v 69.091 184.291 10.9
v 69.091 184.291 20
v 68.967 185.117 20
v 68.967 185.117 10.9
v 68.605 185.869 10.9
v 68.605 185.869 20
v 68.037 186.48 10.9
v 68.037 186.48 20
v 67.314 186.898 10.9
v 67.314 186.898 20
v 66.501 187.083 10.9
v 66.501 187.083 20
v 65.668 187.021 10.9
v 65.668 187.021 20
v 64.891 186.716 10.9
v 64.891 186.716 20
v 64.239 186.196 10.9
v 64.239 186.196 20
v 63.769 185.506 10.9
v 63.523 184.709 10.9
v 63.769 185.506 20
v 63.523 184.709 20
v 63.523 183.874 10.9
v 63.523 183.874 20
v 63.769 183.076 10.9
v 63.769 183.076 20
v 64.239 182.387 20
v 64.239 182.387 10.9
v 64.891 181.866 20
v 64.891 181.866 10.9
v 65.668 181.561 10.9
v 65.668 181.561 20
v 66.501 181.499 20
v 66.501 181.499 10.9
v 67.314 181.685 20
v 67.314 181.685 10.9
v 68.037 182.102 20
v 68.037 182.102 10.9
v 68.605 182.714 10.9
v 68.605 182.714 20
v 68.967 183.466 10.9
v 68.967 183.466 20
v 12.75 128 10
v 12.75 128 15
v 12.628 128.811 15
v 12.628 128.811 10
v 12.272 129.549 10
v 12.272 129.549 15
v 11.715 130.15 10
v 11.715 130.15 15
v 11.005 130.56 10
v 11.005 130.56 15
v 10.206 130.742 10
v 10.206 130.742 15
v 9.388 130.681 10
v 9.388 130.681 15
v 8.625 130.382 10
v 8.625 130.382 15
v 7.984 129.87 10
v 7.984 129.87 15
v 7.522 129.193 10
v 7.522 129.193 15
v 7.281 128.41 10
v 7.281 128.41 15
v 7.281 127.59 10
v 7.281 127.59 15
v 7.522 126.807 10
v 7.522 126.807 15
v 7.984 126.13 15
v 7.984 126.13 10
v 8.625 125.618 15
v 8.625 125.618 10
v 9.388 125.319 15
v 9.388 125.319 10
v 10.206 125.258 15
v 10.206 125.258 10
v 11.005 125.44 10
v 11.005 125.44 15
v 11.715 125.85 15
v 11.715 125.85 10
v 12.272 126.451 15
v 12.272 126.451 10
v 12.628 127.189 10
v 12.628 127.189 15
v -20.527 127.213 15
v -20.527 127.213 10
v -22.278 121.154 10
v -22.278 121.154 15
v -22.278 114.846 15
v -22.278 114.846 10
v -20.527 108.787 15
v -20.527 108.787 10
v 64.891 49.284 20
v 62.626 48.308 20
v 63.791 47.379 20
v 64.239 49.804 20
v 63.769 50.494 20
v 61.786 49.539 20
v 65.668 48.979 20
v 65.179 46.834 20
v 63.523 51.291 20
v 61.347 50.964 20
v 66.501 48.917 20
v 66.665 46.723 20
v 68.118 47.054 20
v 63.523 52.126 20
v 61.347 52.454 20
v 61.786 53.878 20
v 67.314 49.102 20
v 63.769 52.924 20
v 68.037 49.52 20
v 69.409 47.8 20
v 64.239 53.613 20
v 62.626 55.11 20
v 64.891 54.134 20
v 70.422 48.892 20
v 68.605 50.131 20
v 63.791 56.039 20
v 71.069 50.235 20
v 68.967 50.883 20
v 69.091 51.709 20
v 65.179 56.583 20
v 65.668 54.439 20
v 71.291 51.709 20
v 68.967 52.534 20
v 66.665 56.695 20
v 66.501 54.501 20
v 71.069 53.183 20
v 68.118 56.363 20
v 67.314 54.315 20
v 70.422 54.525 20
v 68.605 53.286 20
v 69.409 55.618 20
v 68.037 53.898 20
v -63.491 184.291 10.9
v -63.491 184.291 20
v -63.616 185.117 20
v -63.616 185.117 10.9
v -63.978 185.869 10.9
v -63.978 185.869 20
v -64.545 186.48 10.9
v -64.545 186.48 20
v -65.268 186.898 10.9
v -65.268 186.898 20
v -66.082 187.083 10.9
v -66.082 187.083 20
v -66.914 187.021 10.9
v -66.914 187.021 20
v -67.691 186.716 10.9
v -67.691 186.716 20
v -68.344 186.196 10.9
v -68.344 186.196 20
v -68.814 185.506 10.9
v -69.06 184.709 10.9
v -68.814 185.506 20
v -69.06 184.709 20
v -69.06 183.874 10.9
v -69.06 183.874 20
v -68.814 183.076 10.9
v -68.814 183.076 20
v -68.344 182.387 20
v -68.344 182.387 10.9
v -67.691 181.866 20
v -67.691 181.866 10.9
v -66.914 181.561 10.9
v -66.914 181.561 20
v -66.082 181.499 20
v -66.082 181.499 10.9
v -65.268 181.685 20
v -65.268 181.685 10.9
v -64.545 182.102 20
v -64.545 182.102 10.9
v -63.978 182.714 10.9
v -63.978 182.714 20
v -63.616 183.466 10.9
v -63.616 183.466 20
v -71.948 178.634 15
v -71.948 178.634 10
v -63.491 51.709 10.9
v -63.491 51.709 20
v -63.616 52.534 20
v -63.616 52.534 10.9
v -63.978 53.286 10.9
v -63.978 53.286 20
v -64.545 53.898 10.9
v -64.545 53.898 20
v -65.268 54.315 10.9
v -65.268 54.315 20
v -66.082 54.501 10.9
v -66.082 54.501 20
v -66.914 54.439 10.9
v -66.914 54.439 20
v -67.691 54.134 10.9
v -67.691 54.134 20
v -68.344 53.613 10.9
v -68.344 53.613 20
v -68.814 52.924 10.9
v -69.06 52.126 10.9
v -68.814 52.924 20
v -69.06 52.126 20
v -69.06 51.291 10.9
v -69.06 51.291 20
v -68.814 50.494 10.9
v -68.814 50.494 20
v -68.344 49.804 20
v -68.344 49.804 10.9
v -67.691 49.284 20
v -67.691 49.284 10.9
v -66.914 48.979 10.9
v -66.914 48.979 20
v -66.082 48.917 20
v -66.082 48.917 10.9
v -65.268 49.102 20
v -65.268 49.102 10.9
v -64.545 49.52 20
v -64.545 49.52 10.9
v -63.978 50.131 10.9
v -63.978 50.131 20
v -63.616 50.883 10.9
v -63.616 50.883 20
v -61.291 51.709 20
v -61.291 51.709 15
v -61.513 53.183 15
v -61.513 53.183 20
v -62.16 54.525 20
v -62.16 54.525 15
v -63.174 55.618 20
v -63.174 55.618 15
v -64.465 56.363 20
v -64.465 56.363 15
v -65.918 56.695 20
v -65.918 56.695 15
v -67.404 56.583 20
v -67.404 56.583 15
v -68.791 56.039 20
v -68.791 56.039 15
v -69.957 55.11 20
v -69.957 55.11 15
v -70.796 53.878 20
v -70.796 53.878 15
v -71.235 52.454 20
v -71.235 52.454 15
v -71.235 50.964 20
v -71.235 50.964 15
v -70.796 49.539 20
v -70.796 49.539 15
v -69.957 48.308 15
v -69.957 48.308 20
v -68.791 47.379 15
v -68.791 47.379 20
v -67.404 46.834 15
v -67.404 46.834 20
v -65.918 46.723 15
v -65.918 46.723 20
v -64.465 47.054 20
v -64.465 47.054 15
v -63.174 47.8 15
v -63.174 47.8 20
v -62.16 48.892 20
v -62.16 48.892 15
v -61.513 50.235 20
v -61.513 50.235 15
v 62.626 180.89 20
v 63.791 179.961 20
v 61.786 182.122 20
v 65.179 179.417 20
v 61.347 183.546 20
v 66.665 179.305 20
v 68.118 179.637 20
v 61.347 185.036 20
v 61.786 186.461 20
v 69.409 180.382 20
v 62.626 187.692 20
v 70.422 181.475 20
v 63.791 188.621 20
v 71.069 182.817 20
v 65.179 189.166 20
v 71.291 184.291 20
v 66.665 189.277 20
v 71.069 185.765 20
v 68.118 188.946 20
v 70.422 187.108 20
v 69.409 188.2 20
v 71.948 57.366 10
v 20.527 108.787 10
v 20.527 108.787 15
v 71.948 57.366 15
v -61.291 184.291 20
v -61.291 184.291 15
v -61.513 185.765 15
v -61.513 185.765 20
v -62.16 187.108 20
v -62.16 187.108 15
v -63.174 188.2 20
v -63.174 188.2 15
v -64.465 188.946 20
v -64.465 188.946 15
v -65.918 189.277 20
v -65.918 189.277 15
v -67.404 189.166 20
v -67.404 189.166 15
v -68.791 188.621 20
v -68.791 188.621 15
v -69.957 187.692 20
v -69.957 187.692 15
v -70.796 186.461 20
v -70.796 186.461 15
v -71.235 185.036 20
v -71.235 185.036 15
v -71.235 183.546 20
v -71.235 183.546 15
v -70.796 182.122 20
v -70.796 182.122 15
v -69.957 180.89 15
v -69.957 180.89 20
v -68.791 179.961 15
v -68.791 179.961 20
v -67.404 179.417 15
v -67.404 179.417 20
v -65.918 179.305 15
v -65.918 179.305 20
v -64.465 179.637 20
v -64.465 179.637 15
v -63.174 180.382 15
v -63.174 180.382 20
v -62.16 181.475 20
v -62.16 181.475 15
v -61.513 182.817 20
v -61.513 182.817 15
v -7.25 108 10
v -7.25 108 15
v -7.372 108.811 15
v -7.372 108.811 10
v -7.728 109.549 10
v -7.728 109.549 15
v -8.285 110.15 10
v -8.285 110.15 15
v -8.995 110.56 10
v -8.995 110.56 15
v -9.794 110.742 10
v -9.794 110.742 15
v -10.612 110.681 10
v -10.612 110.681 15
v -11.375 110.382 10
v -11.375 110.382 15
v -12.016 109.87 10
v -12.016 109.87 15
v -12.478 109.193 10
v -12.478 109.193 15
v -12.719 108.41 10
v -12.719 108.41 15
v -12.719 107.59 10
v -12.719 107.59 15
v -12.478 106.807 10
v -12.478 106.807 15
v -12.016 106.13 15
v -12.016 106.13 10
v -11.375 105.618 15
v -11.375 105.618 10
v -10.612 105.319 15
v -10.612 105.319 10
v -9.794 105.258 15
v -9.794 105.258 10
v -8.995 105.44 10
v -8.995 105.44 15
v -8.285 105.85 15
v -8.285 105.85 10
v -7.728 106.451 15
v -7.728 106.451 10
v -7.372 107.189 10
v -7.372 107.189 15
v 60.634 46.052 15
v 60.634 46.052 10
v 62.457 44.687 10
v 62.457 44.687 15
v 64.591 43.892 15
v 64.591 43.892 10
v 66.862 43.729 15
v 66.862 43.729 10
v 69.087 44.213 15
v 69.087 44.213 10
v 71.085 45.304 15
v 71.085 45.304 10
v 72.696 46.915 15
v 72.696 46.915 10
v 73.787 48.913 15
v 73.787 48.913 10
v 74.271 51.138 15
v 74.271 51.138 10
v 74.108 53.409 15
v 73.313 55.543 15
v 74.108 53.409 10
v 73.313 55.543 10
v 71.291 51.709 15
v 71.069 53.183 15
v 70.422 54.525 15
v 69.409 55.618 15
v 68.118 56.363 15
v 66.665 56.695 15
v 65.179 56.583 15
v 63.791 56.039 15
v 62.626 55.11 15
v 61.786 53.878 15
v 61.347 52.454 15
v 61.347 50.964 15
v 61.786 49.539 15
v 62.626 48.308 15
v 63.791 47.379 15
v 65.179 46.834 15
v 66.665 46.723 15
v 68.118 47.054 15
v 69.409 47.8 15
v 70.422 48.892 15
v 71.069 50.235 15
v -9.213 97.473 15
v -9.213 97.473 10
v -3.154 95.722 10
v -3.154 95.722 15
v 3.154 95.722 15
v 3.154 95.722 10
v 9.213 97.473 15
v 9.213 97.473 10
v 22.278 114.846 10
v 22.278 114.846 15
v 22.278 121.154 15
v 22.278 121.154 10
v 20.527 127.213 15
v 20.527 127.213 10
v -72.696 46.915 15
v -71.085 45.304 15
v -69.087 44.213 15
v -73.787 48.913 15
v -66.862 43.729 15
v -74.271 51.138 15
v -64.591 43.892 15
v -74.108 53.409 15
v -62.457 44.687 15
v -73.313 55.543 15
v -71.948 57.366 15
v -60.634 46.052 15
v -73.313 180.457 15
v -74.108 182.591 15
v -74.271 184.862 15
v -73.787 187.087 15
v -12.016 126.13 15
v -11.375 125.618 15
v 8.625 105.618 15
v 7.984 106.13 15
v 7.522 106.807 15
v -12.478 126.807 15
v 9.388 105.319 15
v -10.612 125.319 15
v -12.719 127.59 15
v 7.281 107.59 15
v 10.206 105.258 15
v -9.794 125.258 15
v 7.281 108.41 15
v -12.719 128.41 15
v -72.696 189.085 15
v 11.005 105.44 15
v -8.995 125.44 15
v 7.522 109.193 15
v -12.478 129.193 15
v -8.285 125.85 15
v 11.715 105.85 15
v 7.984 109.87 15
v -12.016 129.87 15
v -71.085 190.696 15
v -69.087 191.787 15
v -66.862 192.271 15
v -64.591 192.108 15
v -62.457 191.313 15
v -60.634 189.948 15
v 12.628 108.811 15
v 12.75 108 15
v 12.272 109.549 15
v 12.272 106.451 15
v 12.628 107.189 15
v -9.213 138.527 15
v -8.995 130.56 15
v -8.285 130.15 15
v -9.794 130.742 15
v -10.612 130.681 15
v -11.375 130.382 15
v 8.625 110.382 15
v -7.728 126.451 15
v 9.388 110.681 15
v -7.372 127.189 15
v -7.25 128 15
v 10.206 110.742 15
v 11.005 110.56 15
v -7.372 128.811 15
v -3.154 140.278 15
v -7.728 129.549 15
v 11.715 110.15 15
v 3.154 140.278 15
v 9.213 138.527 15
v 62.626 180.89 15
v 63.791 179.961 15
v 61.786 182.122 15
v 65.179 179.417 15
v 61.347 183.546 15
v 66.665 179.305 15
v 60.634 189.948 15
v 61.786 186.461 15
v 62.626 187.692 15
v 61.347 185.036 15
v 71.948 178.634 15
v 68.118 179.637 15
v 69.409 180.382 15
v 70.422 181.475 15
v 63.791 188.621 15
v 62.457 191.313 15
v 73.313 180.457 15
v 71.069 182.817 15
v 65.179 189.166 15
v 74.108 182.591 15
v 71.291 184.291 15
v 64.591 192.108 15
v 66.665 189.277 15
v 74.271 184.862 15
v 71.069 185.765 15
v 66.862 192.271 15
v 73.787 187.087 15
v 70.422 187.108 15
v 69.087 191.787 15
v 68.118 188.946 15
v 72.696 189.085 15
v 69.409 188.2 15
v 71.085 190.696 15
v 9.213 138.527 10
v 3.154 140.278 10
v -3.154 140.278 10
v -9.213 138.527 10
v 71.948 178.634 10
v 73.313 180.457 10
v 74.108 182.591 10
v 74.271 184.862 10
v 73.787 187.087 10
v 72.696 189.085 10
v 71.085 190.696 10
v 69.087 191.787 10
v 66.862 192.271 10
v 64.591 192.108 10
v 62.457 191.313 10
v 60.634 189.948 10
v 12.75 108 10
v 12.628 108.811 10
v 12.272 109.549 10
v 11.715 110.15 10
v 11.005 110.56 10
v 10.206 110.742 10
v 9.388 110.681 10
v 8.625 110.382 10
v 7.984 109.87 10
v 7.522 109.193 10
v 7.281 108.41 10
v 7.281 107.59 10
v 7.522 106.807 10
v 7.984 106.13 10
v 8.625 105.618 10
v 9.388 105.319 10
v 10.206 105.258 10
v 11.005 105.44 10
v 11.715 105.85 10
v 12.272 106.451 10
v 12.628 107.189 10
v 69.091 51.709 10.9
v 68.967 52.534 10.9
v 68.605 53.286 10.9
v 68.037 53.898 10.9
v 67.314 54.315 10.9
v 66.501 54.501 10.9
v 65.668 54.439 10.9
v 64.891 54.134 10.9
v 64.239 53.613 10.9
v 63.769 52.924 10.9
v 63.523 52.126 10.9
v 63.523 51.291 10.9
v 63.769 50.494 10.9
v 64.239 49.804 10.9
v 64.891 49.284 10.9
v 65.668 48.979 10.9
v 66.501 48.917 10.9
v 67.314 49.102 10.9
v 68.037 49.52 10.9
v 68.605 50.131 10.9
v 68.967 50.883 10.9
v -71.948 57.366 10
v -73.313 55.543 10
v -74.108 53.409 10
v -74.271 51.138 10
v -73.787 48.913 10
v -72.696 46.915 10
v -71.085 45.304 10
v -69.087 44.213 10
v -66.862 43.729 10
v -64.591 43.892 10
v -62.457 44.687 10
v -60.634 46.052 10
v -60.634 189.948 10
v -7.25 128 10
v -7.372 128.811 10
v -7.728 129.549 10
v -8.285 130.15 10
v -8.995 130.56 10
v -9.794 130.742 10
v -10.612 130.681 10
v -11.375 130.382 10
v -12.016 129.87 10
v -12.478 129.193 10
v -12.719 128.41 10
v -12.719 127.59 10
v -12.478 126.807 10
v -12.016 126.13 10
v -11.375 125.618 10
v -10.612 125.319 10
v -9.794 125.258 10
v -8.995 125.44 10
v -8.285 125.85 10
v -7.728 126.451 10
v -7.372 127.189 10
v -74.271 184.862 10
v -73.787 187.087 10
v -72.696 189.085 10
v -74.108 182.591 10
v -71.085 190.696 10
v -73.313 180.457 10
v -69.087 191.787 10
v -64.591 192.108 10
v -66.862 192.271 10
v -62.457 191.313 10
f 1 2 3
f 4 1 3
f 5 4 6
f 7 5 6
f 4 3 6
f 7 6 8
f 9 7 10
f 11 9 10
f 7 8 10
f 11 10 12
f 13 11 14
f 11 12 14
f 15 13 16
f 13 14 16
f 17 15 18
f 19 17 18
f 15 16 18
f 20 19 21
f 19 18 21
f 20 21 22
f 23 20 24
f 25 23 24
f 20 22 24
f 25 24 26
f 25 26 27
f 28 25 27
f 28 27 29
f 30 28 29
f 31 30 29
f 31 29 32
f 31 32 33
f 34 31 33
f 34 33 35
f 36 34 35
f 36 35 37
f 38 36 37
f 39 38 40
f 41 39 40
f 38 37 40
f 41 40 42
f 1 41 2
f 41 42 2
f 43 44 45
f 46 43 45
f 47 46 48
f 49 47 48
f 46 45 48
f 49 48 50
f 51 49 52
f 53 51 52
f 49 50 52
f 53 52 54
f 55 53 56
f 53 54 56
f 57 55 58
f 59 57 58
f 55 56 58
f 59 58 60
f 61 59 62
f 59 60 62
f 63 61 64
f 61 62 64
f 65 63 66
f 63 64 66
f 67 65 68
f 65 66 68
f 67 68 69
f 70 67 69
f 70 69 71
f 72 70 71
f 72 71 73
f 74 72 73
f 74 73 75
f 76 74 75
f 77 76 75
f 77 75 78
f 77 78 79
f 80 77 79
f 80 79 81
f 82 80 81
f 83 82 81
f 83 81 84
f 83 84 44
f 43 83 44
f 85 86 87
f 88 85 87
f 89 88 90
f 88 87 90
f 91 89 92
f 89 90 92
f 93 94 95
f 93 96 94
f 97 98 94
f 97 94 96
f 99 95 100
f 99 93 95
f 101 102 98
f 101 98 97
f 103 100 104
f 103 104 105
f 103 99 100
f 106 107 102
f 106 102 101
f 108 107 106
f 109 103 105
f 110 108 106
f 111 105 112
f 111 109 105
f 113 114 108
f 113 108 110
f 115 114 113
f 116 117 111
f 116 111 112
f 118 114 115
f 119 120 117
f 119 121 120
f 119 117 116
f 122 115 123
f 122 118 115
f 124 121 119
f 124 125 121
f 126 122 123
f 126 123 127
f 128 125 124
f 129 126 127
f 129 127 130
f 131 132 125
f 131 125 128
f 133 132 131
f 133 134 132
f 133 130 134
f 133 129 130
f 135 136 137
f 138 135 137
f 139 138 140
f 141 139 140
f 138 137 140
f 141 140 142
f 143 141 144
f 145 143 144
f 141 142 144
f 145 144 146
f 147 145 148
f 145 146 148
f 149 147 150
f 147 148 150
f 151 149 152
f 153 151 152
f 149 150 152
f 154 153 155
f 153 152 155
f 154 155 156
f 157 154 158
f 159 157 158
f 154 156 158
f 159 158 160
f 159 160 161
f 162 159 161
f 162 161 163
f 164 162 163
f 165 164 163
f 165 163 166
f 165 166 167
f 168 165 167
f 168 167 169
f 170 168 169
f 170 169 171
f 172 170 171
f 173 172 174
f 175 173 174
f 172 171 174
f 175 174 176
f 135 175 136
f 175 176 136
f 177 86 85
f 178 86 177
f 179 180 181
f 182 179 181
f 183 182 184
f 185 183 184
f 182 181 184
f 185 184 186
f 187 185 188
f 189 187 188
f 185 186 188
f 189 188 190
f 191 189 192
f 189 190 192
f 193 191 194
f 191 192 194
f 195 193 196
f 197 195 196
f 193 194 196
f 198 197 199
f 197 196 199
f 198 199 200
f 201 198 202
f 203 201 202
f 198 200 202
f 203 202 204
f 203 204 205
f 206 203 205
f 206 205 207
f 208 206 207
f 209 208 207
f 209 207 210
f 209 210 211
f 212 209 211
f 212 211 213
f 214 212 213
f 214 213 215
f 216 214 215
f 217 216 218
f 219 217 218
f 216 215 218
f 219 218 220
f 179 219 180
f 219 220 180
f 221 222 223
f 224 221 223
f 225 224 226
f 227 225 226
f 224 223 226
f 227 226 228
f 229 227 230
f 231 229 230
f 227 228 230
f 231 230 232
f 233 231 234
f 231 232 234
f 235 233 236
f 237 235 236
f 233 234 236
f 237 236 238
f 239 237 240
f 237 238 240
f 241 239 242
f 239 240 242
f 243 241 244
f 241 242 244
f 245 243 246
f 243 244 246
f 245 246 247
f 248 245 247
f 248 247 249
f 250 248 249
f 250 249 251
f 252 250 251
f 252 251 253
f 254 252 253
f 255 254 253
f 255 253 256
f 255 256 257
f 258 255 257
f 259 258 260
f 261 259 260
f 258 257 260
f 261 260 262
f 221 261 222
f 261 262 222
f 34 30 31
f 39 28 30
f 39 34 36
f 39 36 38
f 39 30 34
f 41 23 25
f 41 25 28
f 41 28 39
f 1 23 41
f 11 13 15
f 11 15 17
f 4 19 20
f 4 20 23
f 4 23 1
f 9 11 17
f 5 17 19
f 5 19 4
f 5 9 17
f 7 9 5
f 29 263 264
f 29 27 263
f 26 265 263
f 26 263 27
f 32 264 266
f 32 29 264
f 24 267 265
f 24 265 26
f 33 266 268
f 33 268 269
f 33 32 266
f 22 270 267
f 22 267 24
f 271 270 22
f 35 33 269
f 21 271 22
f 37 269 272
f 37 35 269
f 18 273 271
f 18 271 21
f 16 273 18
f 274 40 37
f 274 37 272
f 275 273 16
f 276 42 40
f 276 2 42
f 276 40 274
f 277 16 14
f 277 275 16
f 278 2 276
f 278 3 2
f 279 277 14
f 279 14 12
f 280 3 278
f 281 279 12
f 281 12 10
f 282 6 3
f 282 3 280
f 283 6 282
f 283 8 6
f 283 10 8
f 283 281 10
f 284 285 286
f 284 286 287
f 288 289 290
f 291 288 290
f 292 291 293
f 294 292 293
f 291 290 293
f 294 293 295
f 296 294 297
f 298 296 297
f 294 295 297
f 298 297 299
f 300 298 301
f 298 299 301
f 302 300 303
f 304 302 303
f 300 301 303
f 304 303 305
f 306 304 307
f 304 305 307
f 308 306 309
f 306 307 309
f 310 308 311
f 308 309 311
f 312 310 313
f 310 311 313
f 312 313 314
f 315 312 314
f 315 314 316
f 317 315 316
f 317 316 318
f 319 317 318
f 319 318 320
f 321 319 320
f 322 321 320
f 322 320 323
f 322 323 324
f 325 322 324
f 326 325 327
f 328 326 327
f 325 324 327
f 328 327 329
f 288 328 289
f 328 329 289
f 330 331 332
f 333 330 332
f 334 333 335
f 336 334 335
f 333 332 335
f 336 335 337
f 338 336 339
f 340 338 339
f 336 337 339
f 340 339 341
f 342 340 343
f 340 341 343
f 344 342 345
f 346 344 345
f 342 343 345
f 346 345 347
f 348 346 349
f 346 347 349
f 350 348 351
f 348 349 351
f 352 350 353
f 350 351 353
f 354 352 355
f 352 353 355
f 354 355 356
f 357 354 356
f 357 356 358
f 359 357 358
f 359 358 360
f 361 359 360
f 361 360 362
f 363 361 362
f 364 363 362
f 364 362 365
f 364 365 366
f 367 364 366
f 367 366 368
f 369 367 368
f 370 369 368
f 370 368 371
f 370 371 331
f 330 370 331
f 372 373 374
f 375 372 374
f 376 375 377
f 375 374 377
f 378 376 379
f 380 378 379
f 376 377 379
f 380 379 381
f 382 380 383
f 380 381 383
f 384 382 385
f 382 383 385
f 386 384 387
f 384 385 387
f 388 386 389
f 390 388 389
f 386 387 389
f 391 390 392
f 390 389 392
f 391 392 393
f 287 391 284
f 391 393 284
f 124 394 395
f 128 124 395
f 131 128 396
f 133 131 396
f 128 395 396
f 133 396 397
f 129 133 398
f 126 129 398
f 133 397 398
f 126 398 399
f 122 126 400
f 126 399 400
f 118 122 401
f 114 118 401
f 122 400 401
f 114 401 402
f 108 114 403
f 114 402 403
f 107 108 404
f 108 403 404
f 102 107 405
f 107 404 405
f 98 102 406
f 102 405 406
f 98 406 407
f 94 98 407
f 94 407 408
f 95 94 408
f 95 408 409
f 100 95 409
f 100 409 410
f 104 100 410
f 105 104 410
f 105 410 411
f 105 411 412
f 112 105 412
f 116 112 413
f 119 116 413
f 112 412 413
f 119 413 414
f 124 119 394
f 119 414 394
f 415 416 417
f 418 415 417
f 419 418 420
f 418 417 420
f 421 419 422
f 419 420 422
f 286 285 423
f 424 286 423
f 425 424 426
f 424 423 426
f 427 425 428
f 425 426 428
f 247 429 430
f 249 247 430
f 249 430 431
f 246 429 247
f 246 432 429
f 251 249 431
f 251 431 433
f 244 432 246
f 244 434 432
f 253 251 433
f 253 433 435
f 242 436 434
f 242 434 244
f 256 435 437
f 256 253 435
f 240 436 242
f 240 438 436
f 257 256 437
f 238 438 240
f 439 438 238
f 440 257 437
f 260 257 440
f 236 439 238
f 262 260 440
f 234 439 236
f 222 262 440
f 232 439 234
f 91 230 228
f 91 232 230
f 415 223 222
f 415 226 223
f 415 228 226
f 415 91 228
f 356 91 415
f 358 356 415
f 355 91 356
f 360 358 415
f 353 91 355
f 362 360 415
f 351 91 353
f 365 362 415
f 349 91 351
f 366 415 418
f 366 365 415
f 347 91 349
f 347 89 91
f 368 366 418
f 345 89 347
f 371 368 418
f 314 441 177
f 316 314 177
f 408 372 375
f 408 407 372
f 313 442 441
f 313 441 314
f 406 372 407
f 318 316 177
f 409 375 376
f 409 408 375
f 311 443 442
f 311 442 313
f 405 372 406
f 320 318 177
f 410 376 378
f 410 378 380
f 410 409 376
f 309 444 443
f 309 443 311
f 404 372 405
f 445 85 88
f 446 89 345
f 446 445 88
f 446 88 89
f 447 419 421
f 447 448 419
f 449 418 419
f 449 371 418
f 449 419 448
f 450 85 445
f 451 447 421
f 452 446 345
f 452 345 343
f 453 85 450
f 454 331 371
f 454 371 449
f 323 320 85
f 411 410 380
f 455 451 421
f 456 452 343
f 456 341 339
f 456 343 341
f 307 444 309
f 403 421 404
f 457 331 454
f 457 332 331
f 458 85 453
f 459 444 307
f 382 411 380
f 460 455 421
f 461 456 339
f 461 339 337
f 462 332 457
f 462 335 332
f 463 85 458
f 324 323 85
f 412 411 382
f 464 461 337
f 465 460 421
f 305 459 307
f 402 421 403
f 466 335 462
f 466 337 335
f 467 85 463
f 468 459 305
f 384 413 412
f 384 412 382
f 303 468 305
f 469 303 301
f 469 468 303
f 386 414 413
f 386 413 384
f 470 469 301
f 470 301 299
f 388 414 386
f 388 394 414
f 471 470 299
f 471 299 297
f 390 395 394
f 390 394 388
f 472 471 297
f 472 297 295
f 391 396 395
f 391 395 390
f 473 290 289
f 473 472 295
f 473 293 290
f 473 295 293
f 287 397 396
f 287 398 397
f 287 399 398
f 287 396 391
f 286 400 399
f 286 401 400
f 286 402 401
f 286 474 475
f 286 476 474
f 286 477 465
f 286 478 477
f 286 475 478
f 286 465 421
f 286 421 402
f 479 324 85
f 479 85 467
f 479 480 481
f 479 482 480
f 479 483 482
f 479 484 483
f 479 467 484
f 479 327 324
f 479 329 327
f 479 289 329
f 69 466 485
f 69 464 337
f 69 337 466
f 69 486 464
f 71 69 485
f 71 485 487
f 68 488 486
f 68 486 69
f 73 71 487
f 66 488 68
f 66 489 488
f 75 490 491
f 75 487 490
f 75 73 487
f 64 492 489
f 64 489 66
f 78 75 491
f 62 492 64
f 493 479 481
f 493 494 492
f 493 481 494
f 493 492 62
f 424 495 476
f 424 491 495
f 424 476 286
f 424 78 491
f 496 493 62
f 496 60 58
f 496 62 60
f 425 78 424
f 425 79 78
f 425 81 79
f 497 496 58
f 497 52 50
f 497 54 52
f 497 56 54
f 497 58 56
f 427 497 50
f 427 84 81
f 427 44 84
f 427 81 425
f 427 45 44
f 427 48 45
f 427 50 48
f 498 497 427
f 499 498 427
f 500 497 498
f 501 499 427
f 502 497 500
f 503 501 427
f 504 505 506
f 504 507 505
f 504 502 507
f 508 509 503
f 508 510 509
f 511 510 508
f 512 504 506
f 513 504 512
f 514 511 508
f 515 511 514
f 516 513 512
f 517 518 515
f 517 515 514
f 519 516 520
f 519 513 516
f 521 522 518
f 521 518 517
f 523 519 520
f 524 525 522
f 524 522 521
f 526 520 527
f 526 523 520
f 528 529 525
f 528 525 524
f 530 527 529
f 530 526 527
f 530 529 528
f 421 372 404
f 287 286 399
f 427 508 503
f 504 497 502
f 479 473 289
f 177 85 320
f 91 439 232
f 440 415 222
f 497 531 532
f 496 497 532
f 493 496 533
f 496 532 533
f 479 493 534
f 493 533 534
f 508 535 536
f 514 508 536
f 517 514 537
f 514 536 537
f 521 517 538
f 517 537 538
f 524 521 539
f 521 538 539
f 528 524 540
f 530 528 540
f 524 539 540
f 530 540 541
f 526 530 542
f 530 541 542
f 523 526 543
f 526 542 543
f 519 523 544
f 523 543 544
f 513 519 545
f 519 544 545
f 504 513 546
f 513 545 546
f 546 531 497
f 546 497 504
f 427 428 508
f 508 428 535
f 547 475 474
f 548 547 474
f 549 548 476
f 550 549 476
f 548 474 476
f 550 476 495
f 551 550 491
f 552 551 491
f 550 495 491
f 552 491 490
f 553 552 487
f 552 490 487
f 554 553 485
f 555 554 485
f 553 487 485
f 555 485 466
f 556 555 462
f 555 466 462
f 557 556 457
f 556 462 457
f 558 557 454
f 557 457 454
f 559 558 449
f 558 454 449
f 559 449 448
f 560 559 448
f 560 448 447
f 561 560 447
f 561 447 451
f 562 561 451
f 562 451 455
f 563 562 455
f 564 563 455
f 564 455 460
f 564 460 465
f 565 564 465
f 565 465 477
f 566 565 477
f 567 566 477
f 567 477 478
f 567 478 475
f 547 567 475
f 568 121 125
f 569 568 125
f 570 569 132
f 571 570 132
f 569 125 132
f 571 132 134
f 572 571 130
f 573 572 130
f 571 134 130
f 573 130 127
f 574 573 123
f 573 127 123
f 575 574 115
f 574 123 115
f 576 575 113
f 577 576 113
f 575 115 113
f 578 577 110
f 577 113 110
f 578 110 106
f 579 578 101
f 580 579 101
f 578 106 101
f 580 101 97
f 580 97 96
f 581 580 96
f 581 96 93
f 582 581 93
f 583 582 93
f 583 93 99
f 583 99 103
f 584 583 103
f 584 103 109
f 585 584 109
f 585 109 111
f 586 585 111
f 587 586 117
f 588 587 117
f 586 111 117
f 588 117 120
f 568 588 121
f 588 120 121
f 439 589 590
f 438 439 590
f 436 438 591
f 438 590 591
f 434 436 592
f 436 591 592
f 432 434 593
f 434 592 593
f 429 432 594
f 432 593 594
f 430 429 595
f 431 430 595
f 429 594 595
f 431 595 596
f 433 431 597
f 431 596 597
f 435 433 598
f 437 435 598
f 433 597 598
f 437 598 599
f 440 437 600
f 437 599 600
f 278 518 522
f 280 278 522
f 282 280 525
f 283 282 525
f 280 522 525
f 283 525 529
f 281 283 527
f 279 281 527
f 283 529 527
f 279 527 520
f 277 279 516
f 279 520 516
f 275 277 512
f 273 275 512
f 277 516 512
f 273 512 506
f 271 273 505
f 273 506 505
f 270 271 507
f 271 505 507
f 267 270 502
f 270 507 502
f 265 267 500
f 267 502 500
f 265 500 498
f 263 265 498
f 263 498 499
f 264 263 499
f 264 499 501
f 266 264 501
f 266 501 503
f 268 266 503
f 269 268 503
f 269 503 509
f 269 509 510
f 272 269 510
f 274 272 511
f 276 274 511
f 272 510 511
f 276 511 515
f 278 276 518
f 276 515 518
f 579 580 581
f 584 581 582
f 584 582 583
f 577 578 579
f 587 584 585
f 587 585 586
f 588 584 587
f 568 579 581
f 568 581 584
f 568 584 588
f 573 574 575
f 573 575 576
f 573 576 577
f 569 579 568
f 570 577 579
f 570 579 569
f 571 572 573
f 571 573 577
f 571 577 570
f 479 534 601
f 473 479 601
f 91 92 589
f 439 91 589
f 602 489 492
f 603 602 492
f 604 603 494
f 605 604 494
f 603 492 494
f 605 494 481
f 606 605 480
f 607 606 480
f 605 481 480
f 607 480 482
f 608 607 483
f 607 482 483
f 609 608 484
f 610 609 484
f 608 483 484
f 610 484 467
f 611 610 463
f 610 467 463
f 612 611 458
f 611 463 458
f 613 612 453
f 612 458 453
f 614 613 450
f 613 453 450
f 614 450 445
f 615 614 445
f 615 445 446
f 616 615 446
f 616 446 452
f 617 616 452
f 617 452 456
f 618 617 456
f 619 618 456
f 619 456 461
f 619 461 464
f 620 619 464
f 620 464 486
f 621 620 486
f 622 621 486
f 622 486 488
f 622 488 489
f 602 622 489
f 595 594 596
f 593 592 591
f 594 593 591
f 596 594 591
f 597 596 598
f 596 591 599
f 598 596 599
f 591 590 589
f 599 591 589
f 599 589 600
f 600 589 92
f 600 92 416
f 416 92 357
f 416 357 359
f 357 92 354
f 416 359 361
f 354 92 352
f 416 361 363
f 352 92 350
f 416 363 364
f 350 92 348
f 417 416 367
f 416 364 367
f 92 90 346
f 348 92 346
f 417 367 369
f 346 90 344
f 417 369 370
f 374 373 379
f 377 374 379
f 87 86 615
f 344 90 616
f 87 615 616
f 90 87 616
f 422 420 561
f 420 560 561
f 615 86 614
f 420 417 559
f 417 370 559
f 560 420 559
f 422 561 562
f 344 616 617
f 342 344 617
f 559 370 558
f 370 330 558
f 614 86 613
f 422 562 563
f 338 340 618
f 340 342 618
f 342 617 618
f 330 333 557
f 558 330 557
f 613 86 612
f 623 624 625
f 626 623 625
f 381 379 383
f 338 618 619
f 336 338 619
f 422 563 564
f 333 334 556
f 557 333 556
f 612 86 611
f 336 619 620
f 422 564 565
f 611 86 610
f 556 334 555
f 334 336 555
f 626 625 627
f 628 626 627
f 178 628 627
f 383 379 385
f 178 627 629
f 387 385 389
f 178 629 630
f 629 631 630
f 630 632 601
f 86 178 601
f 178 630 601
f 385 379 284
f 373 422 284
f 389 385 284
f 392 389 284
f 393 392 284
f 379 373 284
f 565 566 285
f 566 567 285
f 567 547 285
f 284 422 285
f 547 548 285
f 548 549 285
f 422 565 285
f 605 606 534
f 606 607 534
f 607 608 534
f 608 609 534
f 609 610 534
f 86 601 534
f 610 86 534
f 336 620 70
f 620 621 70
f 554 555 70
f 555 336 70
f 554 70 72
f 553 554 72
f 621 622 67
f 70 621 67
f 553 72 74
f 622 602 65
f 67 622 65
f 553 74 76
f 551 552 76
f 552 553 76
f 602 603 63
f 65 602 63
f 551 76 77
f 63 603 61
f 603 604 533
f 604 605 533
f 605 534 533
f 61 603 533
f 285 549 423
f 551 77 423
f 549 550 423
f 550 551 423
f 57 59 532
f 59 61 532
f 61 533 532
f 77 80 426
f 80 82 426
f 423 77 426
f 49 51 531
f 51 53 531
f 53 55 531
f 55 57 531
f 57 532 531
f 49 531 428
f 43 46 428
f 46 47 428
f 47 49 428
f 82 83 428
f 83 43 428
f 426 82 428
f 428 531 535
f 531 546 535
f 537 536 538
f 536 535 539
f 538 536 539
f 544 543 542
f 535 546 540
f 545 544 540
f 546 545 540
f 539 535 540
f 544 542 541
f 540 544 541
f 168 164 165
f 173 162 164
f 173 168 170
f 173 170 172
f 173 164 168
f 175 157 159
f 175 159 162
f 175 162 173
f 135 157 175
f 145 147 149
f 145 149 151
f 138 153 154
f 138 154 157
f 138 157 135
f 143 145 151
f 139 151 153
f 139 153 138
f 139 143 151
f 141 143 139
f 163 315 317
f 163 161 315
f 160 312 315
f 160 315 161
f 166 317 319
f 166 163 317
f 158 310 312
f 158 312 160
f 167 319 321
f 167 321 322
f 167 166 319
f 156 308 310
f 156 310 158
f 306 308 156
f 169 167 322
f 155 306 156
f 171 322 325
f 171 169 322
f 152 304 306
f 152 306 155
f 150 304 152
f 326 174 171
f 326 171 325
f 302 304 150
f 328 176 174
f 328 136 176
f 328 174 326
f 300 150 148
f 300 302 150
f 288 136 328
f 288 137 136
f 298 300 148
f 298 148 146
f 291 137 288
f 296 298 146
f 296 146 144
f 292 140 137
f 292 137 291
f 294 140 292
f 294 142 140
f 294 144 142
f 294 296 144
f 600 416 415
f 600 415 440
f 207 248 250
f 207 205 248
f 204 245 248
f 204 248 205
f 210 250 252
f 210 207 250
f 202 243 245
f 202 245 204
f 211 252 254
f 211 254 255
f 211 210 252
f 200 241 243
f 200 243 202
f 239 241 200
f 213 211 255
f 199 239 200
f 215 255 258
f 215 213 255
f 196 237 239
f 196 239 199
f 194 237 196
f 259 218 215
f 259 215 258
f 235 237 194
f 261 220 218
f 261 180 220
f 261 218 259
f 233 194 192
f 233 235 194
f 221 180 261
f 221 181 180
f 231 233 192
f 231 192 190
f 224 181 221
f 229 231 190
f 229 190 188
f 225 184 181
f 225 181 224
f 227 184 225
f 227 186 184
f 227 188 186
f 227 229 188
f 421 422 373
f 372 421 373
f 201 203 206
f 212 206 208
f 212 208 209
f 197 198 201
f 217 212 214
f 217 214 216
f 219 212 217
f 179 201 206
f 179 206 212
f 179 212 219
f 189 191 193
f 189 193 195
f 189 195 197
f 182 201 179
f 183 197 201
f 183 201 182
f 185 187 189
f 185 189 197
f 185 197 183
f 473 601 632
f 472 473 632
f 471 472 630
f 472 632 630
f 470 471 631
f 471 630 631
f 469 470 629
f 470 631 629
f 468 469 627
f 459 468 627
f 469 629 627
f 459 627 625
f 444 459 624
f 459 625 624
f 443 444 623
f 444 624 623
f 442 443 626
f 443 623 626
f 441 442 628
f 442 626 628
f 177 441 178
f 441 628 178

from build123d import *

# Parameters (mm, degrees)
PAD045_DEPTH    = 5
SKETCH132_R     = 2.75
HOLE028_DEPTH   = 25
SKETCH141_R     = 5
PAD049_DEPTH    = 5
SKETCH136_R     = 2.8
POCKET041_DEPTH = 9.1


with BuildPart() as part:
    # Sketch129 → Pad045 (new body)
    with BuildSketch(Plane.XY):
        with BuildLine():
            ThreePointArc((-9.213418, 97.472873), (0, 95.5), (9.213418, 97.472873))
            Line((9.213418, 97.472873), (60.634406, 46.051885))
            ThreePointArc((60.634406, 46.051885), (71.94812, 46.05189), (71.948104, 57.365604))
            Line((20.527127, 108.786582), (71.948104, 57.365604))
            ThreePointArc((20.527127, 108.786582), (22.5, 118), (20.527127, 127.213418))
            Line((20.527127, 127.213418), (71.948104, 178.634396))
            ThreePointArc((71.948104, 178.634396), (71.948104, 189.948104), (60.634396, 189.948104))
            Line((9.213418, 138.527127), (60.634396, 189.948104))
            ThreePointArc((9.213418, 138.527127), (0, 140.5), (-9.213418, 138.527127))
            Line((-9.213418, 138.527127), (-60.634396, 189.948104))
            ThreePointArc((-60.634396, 189.948104), (-71.948104, 189.948104), (-71.948104, 178.634396))
            Line((-20.527127, 127.213418), (-71.948104, 178.634396))
            ThreePointArc((-20.527127, 127.213418), (-22.5, 118), (-20.527127, 108.786582))
            Line((-20.527127, 108.786582), (-71.948121, 57.365588))
            ThreePointArc((-71.948121, 57.365588), (-71.948112, 46.051882), (-60.634406, 46.051885))
            Line((-9.213418, 97.472873), (-60.634406, 46.051885))
        make_face()
    extrude(amount=PAD045_DEPTH)

    # Sketch132 → Hole028 (cut)
    with BuildSketch(Plane.XY.offset(6)):
        with Locations((10, 128)):
            Circle(SKETCH132_R)
        with Locations((10, 108)):
            Circle(SKETCH132_R)
        with Locations((-10, 108)):
            Circle(SKETCH132_R)
        with Locations((-10, 128)):
            Circle(SKETCH132_R)
    extrude(amount=-HOLE028_DEPTH, mode=Mode.SUBTRACT)

    # Sketch141 (on Face5 of Hole028) → Pad049 (join)
    with BuildSketch(Plane.XY.offset(5)):
        with Locations((-66.291261, 51.708739)):
            Circle(SKETCH141_R)
        with Locations((66.291261, 51.708739)):
            Circle(SKETCH141_R)
        with Locations((66.291261, 184.291261)):
            Circle(SKETCH141_R)
        with Locations((-66.291261, 184.291261)):
            Circle(SKETCH141_R)
    extrude(amount=PAD049_DEPTH)

    # Sketch136 (on Face30 of Pad049) → Pocket041 (cut)
    with BuildSketch(Plane.XY.offset(10)):
        with Locations((-66.291261, 184.291261)):
            Circle(SKETCH136_R)
        with Locations((66.291261, 184.291261)):
            Circle(SKETCH136_R)
        with Locations((66.291261, 51.708739)):
            Circle(SKETCH136_R)
        with Locations((-66.291261, 51.708739)):
            Circle(SKETCH136_R)
    extrude(amount=-POCKET041_DEPTH, mode=Mode.SUBTRACT)


with BuildPart() as part_1:
    # Body020 placement: moved
    add(part.part.moved(Location((0, 0, 10))))


solid = part_1.part
